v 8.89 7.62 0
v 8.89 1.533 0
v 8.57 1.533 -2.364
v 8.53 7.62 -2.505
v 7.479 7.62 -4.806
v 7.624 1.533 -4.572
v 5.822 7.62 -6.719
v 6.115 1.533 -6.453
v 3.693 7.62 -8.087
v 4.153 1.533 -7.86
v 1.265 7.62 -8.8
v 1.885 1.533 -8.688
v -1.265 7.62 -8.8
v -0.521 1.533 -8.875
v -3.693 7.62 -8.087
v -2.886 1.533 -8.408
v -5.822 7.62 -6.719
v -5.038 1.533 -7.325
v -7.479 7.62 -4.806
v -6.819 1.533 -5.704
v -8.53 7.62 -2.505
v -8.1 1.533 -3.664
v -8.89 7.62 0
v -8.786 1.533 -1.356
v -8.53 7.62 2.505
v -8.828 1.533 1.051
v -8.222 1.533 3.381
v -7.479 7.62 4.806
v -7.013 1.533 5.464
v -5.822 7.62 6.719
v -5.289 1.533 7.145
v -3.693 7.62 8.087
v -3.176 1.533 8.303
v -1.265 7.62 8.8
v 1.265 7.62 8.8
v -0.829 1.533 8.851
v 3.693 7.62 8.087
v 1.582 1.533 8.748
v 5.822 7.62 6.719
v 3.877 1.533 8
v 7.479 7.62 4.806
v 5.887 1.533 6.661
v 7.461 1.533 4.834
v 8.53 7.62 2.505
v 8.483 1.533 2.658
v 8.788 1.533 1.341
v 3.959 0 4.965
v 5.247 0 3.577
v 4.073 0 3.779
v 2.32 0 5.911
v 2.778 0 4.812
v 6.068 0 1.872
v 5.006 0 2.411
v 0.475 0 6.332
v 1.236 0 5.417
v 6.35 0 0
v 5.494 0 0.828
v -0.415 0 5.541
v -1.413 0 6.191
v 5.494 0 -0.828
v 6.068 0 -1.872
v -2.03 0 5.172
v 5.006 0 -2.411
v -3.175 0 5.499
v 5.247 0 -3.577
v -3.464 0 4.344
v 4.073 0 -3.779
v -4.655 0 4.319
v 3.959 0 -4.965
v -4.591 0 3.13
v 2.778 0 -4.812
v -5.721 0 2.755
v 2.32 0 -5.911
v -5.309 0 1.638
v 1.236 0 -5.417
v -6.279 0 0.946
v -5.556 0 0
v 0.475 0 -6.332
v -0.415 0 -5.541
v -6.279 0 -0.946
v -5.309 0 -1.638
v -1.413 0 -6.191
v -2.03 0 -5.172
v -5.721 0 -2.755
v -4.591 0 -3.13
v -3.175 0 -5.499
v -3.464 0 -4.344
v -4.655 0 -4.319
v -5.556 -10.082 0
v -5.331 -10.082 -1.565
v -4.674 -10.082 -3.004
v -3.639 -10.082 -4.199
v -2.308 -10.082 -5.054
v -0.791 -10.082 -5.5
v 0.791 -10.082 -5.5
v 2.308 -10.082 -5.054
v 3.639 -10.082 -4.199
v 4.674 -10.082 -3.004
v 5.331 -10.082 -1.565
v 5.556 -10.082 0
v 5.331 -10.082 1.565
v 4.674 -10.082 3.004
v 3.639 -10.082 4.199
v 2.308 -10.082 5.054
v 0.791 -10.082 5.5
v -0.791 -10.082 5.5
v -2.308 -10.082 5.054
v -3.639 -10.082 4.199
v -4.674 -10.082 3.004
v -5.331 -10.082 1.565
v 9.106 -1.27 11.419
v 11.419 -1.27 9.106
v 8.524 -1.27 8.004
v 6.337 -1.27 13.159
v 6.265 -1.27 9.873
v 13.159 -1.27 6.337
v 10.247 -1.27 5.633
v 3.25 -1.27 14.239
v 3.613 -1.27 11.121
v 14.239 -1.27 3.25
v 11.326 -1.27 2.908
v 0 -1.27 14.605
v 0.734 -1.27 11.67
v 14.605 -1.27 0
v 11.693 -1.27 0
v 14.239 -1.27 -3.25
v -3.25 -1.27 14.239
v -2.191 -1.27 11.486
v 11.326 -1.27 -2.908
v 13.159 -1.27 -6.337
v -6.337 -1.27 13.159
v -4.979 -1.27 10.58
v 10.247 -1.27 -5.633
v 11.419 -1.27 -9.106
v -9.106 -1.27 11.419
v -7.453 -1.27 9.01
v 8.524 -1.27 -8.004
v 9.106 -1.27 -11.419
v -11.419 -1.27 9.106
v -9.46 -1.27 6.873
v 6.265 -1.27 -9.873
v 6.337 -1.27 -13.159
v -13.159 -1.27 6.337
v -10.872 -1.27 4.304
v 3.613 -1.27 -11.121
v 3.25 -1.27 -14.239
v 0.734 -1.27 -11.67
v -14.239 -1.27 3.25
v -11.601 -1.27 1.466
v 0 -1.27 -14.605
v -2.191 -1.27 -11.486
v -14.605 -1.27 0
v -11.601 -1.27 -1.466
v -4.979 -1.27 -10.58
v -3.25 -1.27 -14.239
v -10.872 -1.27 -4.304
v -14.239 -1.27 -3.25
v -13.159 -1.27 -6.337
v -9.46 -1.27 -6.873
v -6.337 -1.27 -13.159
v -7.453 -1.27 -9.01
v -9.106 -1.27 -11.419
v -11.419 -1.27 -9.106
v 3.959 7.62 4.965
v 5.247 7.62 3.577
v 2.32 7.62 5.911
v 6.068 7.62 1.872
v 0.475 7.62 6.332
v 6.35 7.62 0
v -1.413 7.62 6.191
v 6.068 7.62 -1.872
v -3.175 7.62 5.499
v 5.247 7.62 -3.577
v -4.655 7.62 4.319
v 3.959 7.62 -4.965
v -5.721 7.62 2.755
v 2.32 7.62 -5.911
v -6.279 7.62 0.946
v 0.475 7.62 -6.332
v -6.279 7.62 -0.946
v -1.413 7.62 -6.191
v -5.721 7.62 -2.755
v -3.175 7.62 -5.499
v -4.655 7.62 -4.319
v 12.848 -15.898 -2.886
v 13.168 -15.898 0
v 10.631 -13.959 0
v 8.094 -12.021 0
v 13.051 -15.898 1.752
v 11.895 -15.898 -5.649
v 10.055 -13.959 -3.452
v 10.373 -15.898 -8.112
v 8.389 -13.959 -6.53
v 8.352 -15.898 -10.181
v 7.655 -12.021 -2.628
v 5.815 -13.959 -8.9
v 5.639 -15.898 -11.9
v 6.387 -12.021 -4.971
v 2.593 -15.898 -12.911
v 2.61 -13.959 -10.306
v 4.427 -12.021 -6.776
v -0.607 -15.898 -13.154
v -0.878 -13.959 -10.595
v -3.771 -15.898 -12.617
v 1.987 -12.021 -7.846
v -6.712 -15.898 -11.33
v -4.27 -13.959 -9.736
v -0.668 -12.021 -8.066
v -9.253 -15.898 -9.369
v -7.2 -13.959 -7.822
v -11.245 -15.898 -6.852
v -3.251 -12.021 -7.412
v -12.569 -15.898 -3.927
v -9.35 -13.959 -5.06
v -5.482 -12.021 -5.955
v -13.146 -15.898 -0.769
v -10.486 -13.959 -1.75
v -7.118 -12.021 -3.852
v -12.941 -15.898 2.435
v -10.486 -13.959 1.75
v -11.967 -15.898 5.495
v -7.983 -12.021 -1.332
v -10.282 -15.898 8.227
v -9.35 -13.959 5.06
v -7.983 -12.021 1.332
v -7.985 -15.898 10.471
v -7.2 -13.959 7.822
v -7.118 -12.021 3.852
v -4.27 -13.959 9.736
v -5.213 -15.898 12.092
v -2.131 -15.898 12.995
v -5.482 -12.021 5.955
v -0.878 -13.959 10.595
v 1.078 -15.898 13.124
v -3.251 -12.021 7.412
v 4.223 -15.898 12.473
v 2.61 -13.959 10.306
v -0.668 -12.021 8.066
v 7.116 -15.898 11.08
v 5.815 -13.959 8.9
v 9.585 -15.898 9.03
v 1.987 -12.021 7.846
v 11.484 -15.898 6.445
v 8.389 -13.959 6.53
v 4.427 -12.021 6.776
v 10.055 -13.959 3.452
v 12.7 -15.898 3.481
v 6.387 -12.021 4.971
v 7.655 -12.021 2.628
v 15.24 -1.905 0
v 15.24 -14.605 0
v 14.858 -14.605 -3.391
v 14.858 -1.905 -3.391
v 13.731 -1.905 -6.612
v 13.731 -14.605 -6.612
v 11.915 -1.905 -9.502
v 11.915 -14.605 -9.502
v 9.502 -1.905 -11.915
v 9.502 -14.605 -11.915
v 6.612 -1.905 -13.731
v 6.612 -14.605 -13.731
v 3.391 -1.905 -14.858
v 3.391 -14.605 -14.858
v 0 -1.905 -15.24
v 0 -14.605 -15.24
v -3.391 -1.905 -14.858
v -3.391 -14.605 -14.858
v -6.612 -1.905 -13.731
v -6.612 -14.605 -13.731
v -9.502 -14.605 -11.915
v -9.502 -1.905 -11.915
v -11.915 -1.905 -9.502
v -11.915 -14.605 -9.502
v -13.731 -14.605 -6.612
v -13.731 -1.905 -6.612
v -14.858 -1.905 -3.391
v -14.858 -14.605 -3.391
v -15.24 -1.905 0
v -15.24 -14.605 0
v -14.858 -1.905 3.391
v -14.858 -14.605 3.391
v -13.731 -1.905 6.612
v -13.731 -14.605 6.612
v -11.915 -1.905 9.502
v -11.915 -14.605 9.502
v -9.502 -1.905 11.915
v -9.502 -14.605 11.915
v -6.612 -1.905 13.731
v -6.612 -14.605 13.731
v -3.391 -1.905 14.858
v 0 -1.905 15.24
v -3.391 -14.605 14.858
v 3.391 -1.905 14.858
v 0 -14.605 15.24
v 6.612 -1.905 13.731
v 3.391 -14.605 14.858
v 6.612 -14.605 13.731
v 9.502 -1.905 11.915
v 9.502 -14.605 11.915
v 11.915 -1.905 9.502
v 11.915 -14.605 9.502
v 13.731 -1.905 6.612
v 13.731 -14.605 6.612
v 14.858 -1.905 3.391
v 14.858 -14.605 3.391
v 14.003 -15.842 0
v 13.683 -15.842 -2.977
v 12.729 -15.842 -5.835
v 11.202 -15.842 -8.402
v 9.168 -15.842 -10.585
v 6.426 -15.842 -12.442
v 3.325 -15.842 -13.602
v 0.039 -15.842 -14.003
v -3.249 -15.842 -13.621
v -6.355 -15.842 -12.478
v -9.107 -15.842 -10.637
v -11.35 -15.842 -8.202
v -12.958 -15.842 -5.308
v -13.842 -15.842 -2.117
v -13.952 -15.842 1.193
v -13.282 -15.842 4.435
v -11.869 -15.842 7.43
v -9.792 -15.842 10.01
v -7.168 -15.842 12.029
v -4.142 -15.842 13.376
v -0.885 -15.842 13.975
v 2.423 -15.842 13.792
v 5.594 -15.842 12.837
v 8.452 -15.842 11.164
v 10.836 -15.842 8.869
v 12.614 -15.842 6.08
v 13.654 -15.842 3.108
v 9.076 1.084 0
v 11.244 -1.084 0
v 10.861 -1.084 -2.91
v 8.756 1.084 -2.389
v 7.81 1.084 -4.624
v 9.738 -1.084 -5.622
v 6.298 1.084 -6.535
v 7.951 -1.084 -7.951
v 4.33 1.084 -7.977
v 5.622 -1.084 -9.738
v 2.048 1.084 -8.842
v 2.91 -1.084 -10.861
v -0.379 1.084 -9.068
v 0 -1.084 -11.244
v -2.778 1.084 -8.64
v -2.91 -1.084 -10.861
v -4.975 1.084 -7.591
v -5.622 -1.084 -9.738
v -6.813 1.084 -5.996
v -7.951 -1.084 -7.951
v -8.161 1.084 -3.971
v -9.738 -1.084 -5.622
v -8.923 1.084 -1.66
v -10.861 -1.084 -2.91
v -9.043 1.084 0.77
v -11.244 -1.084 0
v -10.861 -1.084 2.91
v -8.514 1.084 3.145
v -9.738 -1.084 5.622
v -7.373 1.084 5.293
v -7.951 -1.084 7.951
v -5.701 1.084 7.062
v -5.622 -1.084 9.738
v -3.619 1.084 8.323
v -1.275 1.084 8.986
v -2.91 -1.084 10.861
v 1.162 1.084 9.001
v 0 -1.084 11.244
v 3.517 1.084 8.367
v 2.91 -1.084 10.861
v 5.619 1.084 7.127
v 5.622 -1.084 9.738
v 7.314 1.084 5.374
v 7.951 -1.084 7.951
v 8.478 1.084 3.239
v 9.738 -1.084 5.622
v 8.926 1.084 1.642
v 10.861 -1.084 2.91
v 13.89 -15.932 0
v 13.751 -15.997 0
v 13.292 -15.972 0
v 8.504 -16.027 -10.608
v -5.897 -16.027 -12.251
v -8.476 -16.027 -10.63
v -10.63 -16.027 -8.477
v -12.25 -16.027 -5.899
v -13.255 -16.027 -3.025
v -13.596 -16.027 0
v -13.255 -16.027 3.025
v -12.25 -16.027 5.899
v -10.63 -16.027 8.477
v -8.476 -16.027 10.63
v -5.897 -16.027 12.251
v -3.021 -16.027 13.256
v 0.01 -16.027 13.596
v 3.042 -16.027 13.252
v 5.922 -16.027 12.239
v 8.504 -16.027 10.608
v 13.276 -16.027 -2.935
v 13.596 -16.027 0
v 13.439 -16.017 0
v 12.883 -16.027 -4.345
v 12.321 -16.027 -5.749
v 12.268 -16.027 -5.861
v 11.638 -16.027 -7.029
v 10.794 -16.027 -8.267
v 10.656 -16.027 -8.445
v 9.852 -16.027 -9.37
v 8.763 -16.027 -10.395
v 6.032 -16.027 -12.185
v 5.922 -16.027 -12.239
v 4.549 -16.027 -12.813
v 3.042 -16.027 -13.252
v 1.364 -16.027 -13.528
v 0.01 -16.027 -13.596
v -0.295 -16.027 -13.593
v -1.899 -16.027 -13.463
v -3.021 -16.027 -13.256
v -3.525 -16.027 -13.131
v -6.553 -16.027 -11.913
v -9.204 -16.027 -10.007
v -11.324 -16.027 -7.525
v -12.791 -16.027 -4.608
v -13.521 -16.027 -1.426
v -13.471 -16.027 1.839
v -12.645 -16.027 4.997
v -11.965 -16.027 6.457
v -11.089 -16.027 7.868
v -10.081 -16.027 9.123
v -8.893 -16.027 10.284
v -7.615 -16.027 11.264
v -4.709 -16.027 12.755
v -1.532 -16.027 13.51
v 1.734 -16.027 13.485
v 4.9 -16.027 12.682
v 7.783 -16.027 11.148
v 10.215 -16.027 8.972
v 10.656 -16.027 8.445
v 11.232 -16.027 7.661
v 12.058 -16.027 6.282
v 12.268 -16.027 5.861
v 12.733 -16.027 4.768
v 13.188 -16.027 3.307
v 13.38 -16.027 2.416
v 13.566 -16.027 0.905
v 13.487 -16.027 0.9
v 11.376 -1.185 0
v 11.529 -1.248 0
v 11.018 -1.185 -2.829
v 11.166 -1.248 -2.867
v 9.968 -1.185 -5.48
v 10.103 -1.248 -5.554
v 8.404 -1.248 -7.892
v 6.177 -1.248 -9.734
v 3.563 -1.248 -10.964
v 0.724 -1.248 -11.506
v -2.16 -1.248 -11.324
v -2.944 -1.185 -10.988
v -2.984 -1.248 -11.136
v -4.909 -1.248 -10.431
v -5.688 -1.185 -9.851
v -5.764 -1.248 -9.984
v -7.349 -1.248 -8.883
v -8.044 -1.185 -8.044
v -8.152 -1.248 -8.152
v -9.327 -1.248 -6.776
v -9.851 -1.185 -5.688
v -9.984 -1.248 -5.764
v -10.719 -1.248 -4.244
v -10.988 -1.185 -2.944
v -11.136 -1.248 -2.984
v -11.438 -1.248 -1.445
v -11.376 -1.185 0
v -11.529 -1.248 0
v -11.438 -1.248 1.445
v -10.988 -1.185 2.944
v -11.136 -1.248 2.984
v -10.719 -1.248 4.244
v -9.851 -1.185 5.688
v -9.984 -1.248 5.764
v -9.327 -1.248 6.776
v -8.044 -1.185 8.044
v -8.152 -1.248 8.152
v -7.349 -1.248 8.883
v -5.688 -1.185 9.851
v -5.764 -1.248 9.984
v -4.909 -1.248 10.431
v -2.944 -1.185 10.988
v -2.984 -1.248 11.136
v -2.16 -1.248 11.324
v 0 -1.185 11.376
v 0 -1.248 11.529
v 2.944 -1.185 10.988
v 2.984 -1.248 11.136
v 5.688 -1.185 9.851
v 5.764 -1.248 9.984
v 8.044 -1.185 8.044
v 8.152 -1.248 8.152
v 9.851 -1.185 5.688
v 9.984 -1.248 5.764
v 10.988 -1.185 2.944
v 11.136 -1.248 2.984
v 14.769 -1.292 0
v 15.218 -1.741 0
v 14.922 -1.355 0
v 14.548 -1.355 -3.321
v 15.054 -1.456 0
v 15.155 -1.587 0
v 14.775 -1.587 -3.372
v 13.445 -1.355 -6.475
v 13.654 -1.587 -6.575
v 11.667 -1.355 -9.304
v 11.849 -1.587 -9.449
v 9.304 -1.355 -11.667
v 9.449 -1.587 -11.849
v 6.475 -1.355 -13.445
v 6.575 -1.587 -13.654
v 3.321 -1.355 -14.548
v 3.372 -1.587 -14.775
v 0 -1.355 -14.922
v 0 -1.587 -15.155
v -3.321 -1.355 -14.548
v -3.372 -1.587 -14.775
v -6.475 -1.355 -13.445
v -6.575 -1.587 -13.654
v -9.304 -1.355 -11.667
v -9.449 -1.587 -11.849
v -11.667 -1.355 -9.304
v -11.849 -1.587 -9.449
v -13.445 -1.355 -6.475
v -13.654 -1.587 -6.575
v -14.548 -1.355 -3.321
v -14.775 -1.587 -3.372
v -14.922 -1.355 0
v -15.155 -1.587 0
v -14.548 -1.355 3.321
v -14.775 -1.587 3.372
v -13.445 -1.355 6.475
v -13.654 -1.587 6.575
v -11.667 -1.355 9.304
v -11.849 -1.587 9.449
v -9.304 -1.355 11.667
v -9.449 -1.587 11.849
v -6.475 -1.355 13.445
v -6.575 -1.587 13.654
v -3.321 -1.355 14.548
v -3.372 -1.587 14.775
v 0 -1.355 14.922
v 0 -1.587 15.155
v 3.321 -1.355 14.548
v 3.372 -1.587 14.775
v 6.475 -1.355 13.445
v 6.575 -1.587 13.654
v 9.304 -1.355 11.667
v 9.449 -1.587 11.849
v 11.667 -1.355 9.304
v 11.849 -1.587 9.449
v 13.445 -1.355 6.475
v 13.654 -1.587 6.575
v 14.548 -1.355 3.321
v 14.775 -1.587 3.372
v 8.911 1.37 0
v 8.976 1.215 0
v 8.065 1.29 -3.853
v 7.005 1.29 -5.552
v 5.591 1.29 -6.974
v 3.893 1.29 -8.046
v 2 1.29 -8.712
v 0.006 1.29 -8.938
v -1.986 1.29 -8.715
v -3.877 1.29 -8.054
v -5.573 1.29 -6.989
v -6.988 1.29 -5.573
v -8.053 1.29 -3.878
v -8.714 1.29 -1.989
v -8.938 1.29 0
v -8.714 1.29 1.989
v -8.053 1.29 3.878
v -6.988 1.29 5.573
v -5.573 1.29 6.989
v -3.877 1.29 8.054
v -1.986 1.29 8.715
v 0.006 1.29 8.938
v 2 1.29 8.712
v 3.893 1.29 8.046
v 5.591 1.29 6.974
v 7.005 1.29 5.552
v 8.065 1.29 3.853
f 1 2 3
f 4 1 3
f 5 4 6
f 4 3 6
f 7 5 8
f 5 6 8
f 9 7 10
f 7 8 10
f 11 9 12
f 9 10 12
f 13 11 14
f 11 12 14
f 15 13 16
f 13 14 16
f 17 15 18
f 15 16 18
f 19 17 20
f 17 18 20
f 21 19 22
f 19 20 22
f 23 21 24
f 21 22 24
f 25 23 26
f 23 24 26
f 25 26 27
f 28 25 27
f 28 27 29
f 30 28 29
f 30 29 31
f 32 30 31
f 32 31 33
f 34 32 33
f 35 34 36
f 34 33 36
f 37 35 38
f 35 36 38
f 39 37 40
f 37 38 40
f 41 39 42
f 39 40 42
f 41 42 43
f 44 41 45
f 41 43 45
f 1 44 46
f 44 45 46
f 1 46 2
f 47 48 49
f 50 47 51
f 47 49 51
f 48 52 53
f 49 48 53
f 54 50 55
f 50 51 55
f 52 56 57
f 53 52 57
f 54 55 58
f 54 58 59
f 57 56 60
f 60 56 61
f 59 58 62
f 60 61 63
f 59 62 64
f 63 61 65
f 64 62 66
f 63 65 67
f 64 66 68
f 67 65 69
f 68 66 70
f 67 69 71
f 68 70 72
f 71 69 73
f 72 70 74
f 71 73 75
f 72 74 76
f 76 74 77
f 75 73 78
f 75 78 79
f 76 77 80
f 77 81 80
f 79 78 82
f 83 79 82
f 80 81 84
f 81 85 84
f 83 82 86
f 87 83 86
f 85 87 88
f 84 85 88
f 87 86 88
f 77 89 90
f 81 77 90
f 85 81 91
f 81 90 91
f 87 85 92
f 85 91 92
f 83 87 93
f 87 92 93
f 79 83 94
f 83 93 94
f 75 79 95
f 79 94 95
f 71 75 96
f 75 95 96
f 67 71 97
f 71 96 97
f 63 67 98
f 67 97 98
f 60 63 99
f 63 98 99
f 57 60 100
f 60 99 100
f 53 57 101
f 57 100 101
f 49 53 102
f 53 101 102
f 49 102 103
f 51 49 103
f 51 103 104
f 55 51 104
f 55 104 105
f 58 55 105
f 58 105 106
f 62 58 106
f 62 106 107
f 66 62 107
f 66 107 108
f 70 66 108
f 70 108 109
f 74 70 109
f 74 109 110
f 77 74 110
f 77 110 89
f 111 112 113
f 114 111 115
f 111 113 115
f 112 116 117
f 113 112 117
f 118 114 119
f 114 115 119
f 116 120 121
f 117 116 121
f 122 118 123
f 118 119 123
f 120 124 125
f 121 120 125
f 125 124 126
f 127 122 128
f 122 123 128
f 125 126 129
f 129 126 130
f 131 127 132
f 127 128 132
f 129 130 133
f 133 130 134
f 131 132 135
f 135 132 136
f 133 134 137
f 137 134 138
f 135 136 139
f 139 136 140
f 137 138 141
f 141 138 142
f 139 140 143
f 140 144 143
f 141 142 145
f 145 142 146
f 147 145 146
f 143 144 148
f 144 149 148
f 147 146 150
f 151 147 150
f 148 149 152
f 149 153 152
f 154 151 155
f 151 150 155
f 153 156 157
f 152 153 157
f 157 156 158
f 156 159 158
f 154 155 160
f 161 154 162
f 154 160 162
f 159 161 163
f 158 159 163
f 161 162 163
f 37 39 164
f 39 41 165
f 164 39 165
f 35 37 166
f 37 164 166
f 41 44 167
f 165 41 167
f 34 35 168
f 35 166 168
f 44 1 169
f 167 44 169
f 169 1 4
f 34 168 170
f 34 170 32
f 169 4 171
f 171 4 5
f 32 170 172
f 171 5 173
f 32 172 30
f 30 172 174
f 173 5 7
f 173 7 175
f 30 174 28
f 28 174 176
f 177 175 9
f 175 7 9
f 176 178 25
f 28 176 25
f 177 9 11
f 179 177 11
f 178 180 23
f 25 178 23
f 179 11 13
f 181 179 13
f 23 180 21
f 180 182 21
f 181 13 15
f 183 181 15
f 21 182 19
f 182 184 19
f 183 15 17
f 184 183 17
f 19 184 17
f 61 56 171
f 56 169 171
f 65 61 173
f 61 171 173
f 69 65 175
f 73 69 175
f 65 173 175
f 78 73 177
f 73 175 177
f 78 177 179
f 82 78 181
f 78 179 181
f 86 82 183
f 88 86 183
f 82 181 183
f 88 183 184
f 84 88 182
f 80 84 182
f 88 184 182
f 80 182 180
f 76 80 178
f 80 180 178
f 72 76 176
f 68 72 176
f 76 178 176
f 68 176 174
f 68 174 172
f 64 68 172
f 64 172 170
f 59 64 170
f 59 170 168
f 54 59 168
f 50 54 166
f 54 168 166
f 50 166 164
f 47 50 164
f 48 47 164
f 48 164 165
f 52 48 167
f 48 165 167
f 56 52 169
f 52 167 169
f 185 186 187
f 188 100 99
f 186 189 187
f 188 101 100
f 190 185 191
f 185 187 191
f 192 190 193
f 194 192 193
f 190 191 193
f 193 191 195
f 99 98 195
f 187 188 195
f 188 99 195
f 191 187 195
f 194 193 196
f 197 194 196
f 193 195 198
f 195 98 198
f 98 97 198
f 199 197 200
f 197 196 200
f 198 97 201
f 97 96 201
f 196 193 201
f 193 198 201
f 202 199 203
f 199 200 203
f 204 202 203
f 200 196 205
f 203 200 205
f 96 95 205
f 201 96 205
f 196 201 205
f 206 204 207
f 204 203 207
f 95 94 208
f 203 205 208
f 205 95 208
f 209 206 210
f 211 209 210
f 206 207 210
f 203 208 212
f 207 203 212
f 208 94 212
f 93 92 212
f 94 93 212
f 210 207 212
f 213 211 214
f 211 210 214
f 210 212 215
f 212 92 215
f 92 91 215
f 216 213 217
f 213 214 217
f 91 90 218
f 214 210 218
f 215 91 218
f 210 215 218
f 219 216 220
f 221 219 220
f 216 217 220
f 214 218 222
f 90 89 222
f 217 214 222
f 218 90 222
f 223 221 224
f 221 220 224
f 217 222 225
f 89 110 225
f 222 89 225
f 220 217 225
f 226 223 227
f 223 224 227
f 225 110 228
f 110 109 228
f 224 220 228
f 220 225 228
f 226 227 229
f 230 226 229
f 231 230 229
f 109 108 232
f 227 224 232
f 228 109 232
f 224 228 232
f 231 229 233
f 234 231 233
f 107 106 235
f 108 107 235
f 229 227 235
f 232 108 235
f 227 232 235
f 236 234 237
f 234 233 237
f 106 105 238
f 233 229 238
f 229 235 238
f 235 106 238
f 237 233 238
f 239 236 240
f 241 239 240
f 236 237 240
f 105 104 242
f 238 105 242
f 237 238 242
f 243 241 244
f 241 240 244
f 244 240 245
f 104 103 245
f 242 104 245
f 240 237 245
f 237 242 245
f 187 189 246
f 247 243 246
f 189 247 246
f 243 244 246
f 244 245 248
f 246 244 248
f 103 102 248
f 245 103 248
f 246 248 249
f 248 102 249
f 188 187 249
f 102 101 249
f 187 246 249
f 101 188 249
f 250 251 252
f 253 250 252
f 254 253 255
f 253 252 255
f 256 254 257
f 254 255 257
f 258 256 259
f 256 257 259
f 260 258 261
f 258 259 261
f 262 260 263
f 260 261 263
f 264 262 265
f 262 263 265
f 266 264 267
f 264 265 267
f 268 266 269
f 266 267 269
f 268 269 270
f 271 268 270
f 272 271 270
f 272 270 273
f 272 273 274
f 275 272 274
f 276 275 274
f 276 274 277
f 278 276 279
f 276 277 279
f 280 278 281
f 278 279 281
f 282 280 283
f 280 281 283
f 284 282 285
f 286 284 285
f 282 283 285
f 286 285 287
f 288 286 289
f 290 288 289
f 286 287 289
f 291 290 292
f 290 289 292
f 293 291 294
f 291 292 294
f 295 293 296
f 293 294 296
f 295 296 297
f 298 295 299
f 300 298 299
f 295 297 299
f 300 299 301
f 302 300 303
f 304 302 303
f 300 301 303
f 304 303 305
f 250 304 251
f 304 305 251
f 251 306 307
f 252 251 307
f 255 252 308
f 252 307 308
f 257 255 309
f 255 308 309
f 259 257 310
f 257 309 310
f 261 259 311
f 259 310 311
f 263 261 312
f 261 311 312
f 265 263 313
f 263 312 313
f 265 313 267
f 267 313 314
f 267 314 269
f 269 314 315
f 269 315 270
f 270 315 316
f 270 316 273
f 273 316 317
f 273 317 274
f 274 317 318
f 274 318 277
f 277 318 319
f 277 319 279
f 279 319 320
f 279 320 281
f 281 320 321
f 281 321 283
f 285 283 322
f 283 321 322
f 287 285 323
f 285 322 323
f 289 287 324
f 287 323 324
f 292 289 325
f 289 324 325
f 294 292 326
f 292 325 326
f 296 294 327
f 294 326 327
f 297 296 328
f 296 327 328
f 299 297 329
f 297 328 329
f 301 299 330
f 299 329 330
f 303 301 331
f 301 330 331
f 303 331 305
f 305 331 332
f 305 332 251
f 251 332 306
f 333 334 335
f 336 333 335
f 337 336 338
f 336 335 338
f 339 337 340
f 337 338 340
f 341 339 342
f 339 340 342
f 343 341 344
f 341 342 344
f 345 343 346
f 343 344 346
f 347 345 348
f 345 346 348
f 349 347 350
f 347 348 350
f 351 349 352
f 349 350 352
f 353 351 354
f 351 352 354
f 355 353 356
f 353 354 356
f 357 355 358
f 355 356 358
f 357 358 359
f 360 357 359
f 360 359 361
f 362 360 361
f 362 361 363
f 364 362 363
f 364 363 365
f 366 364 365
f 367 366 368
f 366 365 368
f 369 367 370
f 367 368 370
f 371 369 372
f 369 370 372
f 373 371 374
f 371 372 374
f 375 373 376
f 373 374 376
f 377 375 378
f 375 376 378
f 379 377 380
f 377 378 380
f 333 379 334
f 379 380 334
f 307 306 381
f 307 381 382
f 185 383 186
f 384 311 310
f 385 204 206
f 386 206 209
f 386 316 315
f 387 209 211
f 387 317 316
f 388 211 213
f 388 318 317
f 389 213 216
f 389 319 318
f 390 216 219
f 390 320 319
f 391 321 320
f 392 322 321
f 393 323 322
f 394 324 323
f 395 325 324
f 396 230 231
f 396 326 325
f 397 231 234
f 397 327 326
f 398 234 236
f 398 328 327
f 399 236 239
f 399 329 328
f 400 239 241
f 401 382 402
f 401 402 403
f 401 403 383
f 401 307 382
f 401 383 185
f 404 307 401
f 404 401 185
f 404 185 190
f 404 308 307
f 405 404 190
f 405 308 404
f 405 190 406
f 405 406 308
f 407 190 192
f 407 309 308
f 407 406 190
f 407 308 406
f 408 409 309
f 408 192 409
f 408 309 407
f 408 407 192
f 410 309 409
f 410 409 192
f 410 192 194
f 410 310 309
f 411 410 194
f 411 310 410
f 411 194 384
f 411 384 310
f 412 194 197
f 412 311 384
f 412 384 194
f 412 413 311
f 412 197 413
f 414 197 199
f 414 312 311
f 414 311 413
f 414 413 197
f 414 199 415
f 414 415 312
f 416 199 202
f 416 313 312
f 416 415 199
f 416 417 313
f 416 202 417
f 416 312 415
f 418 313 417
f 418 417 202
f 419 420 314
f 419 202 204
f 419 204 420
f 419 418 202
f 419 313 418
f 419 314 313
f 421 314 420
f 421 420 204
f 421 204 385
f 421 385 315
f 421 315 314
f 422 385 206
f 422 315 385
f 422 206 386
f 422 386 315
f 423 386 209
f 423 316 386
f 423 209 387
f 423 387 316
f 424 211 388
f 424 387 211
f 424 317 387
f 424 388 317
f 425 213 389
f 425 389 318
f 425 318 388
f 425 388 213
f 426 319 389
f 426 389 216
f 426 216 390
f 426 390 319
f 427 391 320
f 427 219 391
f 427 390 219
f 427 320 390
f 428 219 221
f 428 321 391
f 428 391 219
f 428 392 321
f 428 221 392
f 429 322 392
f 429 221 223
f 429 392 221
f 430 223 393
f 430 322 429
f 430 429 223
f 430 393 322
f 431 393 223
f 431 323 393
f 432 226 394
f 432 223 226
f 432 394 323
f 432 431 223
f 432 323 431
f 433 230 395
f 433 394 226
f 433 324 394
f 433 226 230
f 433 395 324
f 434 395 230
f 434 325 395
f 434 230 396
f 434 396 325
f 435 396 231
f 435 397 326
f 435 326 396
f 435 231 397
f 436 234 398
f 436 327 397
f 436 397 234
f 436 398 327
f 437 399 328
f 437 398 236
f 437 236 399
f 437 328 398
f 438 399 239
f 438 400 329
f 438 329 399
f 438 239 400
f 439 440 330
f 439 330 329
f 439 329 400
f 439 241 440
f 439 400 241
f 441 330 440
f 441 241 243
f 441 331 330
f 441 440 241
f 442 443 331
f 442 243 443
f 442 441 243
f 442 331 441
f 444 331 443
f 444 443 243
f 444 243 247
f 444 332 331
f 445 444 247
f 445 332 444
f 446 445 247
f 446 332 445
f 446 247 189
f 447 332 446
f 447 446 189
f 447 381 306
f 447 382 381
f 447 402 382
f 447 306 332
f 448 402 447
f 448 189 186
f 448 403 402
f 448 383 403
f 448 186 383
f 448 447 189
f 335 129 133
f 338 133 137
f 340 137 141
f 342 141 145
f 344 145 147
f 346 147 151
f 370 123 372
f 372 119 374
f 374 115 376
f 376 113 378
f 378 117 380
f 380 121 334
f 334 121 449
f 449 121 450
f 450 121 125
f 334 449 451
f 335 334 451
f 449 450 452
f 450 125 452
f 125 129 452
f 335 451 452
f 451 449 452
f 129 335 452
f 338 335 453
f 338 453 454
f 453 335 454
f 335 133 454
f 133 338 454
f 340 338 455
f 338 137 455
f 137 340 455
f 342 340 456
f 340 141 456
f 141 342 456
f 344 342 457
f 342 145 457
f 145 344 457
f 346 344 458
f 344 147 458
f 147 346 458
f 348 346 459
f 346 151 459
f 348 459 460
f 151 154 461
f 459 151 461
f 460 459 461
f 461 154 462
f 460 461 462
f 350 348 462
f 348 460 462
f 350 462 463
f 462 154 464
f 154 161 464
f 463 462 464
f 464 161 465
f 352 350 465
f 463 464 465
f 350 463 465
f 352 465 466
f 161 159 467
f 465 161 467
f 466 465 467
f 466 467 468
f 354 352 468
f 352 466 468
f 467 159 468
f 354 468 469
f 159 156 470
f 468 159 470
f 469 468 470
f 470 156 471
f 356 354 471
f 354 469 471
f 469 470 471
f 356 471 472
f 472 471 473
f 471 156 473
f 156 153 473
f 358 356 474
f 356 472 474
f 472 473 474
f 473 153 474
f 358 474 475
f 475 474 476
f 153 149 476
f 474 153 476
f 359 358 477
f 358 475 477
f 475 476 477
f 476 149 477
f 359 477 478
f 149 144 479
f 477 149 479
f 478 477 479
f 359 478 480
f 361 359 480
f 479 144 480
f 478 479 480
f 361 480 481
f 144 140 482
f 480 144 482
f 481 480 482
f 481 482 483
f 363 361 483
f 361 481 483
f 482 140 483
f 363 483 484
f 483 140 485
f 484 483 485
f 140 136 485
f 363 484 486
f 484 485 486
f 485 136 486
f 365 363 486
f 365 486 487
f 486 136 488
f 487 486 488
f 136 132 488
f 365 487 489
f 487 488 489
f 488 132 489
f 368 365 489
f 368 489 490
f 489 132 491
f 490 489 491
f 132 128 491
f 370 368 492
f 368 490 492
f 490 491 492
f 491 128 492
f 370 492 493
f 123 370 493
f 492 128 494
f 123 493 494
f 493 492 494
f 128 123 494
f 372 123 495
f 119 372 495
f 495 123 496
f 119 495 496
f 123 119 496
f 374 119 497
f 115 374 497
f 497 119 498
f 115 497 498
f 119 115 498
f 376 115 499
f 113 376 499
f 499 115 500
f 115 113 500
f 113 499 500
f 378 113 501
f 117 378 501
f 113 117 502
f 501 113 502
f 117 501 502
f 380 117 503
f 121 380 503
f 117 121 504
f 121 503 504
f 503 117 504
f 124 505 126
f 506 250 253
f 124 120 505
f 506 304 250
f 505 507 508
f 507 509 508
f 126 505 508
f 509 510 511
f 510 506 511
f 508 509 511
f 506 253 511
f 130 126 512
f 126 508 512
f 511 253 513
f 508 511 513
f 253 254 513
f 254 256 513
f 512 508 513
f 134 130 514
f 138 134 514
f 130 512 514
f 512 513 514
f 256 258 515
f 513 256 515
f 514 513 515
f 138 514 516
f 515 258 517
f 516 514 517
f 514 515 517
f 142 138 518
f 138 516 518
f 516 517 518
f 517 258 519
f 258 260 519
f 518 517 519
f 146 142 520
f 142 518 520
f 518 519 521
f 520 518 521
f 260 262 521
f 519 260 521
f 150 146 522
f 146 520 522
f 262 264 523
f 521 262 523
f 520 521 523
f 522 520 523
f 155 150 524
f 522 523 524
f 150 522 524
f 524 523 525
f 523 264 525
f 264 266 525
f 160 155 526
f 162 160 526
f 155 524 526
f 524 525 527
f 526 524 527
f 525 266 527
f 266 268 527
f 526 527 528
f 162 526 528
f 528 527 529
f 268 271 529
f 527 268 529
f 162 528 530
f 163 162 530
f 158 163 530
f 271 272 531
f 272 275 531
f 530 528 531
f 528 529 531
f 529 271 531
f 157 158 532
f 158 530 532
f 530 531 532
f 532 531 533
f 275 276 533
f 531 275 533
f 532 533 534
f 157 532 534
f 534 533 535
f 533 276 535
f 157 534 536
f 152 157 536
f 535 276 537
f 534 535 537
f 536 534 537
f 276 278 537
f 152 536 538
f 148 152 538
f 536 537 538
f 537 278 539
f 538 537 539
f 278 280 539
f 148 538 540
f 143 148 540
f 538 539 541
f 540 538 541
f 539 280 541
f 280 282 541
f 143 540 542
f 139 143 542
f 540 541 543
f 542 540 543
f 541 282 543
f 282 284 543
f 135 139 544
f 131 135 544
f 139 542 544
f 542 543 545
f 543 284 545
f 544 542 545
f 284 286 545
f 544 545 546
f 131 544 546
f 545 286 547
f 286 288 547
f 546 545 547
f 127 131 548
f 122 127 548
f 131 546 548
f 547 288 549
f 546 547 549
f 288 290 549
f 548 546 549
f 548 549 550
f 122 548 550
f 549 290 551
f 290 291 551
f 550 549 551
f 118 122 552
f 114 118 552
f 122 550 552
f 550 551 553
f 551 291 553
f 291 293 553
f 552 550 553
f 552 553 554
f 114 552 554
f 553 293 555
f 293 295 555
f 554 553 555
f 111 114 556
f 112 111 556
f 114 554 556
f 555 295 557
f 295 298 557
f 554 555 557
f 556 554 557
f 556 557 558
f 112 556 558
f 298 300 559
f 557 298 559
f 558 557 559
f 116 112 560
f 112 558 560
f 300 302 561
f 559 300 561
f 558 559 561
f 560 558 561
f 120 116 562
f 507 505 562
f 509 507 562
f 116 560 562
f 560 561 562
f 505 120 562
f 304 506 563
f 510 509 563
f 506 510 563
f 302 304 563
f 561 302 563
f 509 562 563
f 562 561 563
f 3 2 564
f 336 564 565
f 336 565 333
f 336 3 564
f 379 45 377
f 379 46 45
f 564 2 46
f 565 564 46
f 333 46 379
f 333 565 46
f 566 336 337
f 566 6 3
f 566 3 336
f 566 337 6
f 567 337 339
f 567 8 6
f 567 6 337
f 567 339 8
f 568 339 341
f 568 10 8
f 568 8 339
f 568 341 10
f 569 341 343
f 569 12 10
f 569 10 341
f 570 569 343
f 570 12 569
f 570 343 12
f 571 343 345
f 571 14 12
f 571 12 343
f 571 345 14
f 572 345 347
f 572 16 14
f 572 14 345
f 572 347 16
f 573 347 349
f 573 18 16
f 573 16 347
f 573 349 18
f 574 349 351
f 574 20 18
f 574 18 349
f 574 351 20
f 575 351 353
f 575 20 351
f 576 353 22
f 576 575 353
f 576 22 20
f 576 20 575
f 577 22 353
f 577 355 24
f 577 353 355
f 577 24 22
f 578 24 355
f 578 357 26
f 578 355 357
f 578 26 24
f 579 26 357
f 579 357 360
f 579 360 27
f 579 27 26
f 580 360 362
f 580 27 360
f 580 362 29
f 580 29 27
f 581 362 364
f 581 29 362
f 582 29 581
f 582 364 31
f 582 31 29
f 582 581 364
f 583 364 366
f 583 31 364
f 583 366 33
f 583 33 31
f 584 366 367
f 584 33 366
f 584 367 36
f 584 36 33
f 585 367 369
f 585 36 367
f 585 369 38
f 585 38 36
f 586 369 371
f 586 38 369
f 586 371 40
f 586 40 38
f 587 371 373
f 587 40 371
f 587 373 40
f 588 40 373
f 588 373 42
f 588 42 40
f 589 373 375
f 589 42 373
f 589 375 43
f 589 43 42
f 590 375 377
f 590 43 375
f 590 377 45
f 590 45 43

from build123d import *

# Parameters (mm, degrees)
CHAMFER1_SIZE                   = 1.905
FILLET1_R                       = 0.635
F_7_16_0_4375_DOWEL_HOLE1_D     = 11.1125
F_7_16_0_4375_DOWEL_HOLE1_DEPTH = 11.938
F_7_16_0_4375_DOWEL_HOLE1_TIP   = 3.338531814


with BuildPart() as part:
    # Sketch1 → Revolve1 (revolve)
    with BuildSketch(Plane.XY):
        Polygon((0, 0), (6.35, 0), (6.35, 7.62), (8.89, 7.62), (8.89, 1.27), (11.43, -1.27), (15.24, -1.27), (15.24, -16.51), (13.97, -16.51), (0, -5.837068859), align=None)
    revolve(axis=Axis((0, -1033.02, 0), (0, 1, 0)))

    # Chamfer1
    # the kernel refuses this chamfer: 1.905 mm, written as the material it takes off along each edge
    with BuildSketch(Plane(origin=(0, -16.51, 0), x_dir=(1, 0, 0), z_dir=(0, 0, 1))) as chamfer1_piece_1:
        Polygon((15.24, CHAMFER1_SIZE), (15.24 - CHAMFER1_SIZE, 0), (15.24, 0), align=None)
    revolve(axis=Axis((0, -16.51, 0), (0, 1, 0)), mode=Mode.SUBTRACT)

    # Fillet1
    fillet1_edges = [part.edges().sort_by_distance(p)[0] for p in [
        (-13.610020501, -16.234979499, 0),
        (-15.24, -1.27, 0),
        (-11.43, -1.27, 0),
        (-8.89, 1.27, 0),
    ]]
    fillet(fillet1_edges, radius=FILLET1_R)

    # 7/16 (0.4375) Dowel Hole1
    with Locations(Plane(origin=(0, 0, 0), x_dir=(1, 0, 0), z_dir=(0, 1, 0))):
        with Locations((0, 0)):
            Hole(F_7_16_0_4375_DOWEL_HOLE1_D / 2, depth=F_7_16_0_4375_DOWEL_HOLE1_DEPTH)
            with Locations((0, 0, -(F_7_16_0_4375_DOWEL_HOLE1_DEPTH + F_7_16_0_4375_DOWEL_HOLE1_TIP / 2))):  # 118° drill point
                Cone(0, F_7_16_0_4375_DOWEL_HOLE1_D / 2, F_7_16_0_4375_DOWEL_HOLE1_TIP, mode=Mode.SUBTRACT)


solid = part.part
